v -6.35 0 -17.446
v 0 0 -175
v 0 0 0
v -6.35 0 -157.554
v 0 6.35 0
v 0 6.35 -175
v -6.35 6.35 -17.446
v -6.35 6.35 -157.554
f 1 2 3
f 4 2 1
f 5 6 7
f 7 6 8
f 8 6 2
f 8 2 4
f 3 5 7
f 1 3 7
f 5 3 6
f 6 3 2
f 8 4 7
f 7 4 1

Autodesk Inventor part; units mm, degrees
ref_plane "YZ Plane" through (0, 0, 0) normal (1, 0, 0) x (0, 1, 0)
ref_plane "XZ Plane" through (0, 0, 0) normal (0, 1, 0) x (-1, 0, 0)
ref_plane "XY Plane" through (0, 0, 0) normal (0, 0, 1) x (1, 0, 0)
sketch "Sketch1" plane through (0, 0, 0) normal (0, 1, 0) x (-1, 0, 0)
  line L0 (0, 0) -> (0, -175)
  line L1 (0, -175) -> (6.35, -175)
  line L2 (6.35, -175) -> (6.35, 0)
  line L3 (6.35, 0) -> (0, 0)
  dimension "d0" = 175
  dimension "d1" = 6.35
extrude "Extrusion1" add sketch "Sketch1" along normal blind 6.35
sketch "Sketch2" plane through (0, 6.35, 0) normal (0, 1, 0) x (1, 0, 0)
  line L0 (-6.35, 0) -> (0, 0) projected
  line L1 (0, 0) -> (-6.35, 17.4465)
  line L2 (-6.35, 175) -> (-6.35, 0) projected
  line L3 (0, 0) -> (18.5662, 0) construction
  dimension "d4" = 110
extrude "Extrusion2" cut sketch "Sketch2" against normal blind 6.35
sketch "Sketch3" plane through (0, 6.35, 0) normal (0, 1, 0) x (1, 0, 0)
  line L0 (0, 0) -> (0, 175) projected
  line L1 (0, 175) -> (-6.35, 157.5535)
  line L2 (-6.35, 175) -> (-6.35, 17.4465) projected
  line L3 (0, 175) -> (18.5662, 175) construction
  line L4 (0, 175) -> (-6.35, 175) projected
  line L5 (-6.35, 157.5535) -> (-6.35, 175)
  line L6 (-6.35, 175) -> (0, 175)
  dimension "d7" = 110
extrude "Extrusion3" cut sketch "Sketch3" against normal blind 10
properties part number "Top"
